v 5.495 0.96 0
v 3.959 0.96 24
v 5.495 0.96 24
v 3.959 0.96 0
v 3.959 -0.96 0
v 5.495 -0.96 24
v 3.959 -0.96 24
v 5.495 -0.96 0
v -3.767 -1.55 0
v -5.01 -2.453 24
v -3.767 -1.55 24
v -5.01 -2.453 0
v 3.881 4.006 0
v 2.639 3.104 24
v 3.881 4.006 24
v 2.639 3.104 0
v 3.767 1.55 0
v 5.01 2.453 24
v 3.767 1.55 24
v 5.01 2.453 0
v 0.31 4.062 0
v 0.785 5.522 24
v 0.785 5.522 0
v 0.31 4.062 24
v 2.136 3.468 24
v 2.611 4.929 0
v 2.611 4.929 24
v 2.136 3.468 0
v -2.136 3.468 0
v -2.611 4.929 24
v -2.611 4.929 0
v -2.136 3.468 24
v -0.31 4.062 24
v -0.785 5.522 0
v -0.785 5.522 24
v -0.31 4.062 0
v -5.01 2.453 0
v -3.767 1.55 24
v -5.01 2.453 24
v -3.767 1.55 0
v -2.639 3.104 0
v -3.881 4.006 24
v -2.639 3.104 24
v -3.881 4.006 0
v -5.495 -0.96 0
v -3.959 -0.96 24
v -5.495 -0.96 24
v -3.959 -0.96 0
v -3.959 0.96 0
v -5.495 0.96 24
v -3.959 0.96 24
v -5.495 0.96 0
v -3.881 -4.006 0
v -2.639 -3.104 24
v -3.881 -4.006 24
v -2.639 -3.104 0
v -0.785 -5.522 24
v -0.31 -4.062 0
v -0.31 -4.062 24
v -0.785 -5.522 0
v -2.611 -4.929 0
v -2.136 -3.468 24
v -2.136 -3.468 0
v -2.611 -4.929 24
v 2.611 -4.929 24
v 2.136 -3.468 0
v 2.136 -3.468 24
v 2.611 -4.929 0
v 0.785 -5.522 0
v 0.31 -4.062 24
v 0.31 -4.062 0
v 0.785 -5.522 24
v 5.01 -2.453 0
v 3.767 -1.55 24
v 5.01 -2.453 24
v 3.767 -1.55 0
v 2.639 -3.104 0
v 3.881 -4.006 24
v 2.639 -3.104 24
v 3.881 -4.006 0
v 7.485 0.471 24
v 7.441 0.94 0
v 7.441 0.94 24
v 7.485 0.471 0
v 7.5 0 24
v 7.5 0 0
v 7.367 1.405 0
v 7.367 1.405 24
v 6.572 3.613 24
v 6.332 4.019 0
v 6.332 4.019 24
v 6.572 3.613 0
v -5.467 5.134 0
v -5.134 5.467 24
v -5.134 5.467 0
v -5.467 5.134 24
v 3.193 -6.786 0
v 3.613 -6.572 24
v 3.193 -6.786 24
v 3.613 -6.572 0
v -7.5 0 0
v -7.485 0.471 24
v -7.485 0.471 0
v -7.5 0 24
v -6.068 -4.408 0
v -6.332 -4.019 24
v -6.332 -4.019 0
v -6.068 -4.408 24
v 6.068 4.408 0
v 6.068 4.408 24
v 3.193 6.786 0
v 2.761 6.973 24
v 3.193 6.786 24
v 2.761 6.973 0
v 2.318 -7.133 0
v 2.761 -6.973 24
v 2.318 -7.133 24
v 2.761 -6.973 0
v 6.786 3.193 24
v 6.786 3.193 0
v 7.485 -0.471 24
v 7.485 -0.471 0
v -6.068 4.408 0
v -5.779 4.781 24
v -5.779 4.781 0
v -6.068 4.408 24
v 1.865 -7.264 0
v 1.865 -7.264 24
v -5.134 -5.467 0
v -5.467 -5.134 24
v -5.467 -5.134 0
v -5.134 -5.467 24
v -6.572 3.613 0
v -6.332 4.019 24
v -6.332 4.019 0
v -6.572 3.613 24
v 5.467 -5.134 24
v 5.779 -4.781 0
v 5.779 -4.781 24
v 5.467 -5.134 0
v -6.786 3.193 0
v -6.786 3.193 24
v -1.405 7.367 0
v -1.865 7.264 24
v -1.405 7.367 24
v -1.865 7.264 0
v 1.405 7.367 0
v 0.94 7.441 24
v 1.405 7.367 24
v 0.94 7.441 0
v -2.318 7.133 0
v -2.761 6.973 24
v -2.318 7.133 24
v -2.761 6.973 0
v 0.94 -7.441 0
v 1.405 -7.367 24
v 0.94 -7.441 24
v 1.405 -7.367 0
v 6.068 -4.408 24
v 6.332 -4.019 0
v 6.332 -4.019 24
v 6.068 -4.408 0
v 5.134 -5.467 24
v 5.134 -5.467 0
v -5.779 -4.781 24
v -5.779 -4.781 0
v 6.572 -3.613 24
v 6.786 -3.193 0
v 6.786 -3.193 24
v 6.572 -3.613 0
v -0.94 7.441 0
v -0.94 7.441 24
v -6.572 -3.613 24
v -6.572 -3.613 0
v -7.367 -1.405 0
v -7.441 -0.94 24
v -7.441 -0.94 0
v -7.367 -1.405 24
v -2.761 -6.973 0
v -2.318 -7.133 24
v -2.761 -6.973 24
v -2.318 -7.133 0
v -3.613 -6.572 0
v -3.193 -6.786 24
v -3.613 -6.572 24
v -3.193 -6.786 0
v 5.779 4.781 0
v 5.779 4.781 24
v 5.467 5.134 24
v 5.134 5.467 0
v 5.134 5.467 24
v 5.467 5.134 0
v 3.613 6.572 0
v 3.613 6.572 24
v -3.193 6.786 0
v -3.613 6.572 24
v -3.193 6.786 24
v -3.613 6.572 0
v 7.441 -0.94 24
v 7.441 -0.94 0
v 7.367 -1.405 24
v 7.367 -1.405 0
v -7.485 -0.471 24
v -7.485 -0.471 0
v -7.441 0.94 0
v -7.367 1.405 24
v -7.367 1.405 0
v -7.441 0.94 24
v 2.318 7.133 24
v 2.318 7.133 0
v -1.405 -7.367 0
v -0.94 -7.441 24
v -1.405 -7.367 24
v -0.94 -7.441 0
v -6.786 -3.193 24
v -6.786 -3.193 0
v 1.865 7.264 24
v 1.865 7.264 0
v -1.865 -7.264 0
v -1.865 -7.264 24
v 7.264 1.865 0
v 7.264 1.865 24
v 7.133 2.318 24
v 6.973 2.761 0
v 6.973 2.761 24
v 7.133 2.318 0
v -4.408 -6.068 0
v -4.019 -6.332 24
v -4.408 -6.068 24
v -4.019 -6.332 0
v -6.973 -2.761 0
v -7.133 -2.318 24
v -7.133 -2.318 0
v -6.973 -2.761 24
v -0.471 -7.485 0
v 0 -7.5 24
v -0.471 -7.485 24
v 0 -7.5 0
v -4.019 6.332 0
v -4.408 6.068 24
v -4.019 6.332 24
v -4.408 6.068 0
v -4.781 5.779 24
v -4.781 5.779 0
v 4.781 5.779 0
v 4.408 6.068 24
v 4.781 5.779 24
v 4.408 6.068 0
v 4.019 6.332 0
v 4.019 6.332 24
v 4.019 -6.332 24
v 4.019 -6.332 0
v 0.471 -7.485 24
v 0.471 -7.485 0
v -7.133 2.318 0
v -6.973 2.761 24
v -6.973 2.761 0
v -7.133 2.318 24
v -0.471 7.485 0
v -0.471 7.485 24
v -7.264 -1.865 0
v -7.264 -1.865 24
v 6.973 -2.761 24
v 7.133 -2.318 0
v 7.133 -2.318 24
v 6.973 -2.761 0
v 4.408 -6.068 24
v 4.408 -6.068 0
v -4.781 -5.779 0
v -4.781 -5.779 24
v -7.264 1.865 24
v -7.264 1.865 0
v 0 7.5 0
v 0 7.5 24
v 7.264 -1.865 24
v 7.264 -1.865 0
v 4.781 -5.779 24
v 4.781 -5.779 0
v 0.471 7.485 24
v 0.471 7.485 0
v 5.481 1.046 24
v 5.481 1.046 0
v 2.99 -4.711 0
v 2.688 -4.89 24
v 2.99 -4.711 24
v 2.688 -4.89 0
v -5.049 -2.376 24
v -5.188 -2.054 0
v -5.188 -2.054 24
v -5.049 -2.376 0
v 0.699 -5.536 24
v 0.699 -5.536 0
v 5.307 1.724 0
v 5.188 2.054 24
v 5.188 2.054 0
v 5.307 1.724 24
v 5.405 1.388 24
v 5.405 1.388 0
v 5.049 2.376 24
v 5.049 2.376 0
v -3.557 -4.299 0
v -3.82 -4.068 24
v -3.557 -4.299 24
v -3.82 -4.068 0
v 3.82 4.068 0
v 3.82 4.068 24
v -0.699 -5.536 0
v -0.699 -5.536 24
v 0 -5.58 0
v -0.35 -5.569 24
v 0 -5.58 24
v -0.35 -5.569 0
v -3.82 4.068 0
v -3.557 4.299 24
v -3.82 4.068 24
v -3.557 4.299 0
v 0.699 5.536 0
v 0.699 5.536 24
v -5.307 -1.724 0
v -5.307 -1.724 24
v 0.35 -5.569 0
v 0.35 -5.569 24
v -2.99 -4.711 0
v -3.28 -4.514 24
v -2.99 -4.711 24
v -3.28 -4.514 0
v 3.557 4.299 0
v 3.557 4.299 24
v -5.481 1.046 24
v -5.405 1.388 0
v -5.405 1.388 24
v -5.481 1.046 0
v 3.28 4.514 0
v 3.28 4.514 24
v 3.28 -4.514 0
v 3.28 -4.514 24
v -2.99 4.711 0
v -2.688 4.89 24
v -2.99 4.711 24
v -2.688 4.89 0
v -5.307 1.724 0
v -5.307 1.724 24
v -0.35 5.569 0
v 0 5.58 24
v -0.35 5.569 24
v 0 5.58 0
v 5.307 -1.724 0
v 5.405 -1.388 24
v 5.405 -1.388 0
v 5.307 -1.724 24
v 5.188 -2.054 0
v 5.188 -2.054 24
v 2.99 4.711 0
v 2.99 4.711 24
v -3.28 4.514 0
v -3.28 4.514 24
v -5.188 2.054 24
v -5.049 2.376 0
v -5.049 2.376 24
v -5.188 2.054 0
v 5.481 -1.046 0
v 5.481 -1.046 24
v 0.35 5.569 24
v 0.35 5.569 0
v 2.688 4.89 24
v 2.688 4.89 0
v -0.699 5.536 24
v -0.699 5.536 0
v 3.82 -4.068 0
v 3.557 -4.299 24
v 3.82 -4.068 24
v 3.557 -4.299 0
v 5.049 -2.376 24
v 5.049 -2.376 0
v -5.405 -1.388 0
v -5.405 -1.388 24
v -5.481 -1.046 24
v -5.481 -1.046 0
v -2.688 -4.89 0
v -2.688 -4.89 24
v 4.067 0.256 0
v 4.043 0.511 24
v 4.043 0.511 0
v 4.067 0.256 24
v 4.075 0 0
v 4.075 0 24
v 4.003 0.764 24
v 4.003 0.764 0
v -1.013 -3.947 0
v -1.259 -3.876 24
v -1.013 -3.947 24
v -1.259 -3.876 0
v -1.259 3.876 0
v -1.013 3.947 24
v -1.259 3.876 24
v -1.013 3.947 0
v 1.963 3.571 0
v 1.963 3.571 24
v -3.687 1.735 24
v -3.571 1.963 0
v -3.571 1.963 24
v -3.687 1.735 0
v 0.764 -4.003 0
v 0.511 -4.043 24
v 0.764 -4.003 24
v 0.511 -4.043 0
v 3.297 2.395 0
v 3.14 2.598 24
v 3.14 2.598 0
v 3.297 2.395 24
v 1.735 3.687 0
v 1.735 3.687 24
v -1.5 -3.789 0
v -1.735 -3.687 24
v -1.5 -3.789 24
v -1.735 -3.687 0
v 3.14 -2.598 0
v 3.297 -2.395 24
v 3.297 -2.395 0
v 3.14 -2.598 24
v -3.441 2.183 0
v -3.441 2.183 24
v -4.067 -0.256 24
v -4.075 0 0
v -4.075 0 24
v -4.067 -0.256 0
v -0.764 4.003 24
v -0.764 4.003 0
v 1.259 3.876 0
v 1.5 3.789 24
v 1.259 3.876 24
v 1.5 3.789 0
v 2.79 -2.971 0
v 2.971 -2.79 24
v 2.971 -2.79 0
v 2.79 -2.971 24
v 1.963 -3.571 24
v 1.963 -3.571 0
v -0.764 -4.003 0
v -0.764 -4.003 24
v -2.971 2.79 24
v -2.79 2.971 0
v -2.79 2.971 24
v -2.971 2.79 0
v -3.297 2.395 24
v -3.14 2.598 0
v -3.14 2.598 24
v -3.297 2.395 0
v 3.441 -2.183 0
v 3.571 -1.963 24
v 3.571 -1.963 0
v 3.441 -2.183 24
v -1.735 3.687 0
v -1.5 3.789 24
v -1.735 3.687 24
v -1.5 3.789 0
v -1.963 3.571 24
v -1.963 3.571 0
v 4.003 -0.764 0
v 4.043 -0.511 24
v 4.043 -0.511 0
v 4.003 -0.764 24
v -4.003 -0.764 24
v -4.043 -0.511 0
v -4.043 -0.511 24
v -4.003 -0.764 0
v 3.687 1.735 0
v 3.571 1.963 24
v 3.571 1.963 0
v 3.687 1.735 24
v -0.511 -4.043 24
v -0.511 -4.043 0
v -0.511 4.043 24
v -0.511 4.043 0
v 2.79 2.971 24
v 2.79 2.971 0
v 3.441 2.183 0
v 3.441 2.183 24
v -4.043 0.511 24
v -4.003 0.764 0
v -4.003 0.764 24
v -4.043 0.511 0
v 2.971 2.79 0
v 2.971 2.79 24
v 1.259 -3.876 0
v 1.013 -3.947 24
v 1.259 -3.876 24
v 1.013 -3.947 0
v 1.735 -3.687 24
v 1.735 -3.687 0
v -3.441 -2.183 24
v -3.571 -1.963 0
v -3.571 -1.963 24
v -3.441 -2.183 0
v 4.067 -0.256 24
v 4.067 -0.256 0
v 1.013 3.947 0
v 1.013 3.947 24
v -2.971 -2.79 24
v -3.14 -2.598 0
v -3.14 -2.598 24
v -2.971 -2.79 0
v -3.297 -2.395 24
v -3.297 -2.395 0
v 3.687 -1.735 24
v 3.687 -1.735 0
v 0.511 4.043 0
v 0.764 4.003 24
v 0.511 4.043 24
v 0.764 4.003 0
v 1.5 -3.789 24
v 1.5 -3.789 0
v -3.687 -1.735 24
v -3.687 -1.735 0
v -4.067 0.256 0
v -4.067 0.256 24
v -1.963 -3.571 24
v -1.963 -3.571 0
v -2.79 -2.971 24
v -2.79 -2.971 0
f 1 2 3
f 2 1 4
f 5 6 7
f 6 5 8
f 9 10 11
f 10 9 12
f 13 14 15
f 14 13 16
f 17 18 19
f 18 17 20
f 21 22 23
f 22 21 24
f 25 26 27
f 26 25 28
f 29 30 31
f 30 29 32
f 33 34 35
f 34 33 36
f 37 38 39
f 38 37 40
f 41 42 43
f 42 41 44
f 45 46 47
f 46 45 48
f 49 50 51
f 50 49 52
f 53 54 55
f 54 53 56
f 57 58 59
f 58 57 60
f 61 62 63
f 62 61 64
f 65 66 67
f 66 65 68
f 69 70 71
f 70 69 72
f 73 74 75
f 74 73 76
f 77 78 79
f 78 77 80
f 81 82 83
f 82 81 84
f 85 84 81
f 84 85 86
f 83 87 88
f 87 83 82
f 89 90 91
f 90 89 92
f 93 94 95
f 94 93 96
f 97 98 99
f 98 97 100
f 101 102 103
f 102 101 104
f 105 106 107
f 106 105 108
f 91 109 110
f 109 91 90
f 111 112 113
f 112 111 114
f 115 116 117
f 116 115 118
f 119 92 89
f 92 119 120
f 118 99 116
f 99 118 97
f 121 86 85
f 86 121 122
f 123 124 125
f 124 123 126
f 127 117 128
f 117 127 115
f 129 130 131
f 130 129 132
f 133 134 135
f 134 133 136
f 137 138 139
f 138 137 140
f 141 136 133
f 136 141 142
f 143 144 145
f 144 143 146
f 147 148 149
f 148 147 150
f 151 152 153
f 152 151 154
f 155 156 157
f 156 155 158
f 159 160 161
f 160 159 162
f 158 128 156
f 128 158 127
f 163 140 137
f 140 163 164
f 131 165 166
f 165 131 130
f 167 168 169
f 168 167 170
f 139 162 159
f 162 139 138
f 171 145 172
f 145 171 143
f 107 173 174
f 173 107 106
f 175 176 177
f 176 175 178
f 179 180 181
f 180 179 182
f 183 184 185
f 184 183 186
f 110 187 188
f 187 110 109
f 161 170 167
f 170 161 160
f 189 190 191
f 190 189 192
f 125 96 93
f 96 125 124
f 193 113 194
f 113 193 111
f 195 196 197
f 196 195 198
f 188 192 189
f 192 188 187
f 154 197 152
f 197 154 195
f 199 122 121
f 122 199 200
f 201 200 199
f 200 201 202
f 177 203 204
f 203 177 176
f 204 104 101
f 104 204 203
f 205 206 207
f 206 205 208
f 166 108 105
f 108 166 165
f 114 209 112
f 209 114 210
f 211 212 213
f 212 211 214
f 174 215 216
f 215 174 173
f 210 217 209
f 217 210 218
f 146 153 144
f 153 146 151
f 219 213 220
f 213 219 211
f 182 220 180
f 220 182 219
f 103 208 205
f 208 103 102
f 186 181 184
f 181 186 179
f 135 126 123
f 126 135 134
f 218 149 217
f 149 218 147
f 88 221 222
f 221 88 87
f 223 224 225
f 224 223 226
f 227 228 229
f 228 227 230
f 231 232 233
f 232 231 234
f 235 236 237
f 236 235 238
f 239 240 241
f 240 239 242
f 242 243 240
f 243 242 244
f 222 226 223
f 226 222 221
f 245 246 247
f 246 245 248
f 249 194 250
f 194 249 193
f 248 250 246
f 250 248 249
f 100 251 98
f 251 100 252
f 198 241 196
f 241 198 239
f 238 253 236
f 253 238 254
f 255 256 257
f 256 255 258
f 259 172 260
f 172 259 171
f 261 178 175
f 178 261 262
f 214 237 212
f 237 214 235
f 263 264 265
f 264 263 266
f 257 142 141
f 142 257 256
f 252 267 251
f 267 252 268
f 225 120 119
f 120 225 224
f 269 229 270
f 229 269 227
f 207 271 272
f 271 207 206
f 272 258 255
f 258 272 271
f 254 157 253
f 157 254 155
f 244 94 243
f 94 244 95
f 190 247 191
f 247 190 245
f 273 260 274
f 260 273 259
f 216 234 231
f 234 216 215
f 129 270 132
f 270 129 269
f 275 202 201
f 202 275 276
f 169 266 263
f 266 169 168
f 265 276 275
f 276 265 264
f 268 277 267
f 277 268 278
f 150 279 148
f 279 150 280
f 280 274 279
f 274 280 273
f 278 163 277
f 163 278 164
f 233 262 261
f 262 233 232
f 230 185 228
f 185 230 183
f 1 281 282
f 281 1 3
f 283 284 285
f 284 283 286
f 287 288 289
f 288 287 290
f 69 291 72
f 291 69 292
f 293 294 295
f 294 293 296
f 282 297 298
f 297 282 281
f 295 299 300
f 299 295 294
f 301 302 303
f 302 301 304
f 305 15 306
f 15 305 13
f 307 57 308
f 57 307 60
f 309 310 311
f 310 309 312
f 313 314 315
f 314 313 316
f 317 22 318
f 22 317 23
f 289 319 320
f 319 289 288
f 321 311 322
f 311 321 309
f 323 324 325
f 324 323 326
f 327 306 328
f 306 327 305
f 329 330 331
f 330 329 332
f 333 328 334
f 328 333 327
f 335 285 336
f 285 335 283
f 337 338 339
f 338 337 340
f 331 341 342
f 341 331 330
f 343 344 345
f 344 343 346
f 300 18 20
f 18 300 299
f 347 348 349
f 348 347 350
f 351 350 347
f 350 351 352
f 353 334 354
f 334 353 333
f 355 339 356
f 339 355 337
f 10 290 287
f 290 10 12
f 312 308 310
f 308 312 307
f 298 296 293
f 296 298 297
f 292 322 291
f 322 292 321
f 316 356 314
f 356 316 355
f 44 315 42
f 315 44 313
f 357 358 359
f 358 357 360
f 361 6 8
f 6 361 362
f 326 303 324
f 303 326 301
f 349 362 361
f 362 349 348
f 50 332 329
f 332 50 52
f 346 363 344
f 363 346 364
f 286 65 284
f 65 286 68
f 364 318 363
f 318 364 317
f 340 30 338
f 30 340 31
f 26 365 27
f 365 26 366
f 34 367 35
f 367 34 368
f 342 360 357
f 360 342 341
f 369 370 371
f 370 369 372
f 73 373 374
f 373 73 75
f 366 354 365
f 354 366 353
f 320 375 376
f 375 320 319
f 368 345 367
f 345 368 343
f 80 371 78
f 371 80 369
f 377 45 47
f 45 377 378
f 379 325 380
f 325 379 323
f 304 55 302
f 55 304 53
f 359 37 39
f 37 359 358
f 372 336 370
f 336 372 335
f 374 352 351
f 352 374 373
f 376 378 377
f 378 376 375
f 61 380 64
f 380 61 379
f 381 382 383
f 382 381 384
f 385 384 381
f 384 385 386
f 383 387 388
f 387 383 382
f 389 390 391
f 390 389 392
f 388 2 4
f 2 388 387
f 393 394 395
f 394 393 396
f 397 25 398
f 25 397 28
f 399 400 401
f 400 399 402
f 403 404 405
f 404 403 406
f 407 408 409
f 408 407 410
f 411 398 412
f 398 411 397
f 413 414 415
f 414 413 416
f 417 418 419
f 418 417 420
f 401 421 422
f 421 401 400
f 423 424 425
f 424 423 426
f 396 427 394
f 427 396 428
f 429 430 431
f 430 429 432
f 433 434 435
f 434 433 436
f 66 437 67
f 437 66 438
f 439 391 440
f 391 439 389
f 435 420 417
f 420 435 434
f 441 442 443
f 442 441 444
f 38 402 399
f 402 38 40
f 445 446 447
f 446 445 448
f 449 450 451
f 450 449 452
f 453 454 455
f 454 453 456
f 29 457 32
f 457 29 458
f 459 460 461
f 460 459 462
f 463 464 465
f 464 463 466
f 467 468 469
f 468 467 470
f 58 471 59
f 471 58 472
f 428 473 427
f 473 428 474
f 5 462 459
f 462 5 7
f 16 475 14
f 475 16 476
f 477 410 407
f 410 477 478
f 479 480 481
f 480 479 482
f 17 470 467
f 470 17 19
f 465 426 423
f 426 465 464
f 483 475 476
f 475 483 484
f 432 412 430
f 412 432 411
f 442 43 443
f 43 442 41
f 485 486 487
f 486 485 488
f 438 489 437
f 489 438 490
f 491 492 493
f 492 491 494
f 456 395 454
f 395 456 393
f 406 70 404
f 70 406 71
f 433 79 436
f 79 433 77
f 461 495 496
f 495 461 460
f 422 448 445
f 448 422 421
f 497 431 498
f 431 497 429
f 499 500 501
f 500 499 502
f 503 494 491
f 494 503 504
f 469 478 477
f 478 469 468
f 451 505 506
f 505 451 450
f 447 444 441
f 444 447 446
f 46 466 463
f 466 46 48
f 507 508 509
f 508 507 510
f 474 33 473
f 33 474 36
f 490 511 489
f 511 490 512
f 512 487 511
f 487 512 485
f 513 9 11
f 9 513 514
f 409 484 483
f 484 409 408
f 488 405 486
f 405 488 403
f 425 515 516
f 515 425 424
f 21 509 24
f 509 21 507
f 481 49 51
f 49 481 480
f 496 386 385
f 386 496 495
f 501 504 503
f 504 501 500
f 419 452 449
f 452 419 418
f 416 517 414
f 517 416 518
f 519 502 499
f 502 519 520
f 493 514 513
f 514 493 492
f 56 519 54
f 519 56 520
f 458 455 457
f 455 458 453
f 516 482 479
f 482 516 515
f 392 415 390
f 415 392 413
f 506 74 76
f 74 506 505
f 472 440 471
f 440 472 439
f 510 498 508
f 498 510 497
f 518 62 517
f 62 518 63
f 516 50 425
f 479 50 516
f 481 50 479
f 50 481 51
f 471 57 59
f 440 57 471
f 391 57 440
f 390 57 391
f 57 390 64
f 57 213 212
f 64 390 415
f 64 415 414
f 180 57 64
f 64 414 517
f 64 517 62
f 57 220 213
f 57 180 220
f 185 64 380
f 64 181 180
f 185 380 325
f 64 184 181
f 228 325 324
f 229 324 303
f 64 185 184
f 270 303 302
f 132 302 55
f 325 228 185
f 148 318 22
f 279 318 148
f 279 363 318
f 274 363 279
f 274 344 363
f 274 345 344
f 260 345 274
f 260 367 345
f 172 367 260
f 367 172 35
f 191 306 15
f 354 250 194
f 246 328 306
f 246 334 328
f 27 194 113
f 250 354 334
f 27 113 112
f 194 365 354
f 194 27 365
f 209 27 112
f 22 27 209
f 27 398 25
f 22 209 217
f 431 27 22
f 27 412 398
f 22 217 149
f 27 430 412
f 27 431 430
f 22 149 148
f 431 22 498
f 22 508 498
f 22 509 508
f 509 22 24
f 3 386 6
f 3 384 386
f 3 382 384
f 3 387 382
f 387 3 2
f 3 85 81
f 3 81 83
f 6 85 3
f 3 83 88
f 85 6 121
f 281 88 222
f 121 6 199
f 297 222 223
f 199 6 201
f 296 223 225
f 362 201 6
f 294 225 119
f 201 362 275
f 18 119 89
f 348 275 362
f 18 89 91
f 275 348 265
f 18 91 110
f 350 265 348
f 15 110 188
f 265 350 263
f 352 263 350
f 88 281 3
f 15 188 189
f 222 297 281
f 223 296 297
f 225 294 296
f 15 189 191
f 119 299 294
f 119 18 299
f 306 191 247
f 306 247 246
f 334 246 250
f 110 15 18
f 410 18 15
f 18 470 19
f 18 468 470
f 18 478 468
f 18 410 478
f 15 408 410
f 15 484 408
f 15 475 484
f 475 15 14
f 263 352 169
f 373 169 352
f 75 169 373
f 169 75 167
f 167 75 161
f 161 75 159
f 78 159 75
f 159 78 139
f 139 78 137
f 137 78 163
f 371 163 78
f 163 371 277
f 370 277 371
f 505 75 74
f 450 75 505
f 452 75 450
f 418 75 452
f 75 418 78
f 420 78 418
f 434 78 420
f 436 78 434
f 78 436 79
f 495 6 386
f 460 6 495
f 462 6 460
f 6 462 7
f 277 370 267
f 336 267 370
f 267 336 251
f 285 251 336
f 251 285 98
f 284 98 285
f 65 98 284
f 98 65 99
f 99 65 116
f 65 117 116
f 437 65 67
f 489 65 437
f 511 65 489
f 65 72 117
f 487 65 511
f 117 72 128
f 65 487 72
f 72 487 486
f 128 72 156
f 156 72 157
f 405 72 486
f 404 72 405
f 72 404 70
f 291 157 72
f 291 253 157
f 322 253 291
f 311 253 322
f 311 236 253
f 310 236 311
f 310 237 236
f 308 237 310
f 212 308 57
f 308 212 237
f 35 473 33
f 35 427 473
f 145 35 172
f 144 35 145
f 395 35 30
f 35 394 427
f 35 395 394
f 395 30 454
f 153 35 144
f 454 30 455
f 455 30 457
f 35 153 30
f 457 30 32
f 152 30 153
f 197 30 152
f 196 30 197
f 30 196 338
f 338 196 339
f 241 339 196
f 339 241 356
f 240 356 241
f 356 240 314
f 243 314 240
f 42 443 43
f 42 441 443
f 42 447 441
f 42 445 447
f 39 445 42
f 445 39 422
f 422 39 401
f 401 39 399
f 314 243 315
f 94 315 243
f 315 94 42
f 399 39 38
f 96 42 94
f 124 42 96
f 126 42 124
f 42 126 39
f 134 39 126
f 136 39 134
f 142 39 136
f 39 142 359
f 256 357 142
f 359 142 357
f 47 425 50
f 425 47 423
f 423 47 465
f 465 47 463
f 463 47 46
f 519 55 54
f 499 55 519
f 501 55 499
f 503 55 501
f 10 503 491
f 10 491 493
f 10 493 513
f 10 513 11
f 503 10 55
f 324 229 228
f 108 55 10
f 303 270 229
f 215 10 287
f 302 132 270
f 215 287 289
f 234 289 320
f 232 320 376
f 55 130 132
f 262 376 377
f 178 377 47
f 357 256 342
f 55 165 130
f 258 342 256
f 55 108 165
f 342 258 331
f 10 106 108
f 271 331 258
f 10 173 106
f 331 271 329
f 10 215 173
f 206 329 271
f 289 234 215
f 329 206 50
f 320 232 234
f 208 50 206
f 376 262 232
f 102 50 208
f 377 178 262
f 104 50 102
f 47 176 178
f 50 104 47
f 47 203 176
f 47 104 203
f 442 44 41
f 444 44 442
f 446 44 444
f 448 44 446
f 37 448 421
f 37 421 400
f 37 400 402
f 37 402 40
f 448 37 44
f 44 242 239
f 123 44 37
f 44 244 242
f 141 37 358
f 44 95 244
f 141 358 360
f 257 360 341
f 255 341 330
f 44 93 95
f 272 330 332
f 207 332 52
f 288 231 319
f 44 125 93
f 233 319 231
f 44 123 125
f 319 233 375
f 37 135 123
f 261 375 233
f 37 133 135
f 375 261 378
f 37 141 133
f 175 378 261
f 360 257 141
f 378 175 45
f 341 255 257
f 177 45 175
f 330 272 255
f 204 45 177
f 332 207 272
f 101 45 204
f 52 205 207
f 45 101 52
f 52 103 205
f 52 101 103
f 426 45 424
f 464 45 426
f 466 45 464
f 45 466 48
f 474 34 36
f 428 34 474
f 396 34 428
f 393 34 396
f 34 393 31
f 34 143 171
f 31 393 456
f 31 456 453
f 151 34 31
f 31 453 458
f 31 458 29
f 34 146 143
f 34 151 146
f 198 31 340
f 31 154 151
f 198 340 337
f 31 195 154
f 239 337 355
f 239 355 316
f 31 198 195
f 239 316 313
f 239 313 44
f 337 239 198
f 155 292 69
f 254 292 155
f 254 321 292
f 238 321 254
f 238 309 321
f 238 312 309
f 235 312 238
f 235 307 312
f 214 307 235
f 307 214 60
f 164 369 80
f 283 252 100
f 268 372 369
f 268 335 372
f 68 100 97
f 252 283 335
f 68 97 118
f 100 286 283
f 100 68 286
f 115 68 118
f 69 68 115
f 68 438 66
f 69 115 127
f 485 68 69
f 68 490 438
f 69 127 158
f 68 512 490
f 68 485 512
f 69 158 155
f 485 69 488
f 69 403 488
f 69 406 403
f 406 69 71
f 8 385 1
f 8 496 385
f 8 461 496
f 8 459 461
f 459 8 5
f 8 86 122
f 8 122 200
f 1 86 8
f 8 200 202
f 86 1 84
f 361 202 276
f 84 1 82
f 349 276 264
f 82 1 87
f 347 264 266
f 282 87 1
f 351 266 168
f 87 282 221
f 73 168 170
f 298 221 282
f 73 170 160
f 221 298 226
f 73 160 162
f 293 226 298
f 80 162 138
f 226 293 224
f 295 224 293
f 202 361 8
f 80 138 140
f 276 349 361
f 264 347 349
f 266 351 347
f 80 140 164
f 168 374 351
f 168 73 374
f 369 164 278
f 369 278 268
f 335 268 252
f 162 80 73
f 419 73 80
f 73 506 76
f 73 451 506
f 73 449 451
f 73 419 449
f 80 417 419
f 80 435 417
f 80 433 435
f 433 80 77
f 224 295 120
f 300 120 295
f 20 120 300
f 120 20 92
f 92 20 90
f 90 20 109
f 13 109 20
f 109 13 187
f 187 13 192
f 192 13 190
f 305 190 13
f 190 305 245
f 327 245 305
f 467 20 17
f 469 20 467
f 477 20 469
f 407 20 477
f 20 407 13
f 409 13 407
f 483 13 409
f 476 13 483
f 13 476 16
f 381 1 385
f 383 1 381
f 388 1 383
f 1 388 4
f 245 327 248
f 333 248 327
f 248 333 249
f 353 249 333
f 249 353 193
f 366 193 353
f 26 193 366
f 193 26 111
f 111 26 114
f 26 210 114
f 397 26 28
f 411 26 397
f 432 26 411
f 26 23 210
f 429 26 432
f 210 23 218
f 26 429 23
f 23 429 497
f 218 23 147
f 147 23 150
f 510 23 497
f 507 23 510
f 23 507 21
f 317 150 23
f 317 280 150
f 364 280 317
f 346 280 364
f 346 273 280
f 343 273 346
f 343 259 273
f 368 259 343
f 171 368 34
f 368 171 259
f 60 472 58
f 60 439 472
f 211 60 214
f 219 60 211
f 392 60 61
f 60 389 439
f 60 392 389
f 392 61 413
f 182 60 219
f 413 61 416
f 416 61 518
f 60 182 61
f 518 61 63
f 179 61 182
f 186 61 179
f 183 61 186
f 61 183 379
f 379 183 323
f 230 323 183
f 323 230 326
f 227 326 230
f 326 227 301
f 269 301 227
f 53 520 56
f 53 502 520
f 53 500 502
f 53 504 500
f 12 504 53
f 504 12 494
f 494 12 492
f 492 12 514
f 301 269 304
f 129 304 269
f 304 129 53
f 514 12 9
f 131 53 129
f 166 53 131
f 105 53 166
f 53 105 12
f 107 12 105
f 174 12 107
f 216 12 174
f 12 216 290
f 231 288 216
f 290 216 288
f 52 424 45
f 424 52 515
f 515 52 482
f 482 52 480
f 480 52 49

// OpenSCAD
 /*
 * Customizable Linear Bushing - https://www.thingiverse.com/thing:2202854
 * by Dennis Hofmann - https://www.thingiverse.com/mightynozzle/about
 * created 2017-03-25
 * updated 2018-02-15
 * version v1.8
 *
 * Changelog
 * --------------
 * v1.8:
 *      - groove option added
 * v1.7:
 *      - fixed inner diameter
 * v1.6:
 *      - added chamfer angle option
 * v1.5:
 *      - fixed graphic glitch
 * v1.4:
 *      - added chamfer option
 *
 * v1.1-1.3:
 *      - initial model with minor changes in description
 *
 * --------------
 * 
 * This work is licensed under the Creative Commons - Attribution - Non-Commercial license.
 * https://creativecommons.org/licenses/by-nc/3.0/
 */
 
 // Parameter Section //
//-------------------//

/* [Bushing Settings] */

// Equals dr in technical diagrams. Use the outer diameter of the rod
// + tolerance value of your printer. Do some test prints before print
// a whole set of bushings. Best way in my case is to choose the
// bushing where can push it in with some effort on the rod and slide
// it by hand without any tools. Then slide it back and forth along
// the rod, until the bushing has the expected behavior. I suggest you
// not to use any drill or heat. The sliding of the bushing generates
// enough heat from its friction against the rod. Standard values:
// 6.00 for LM6(L)UU, 8.00 (default 8.15) for LM8(L)UU, 10.00 for
// LM10(L)UU, 12.00 for LM12(L)UU, 16.00 for LM16UU, ...
inner_diameter_in_millimeter = 8.15;

// Equals D in technical diagrams. Use the inner diameter of housing
// where the bushing sits + tolerance value of your printer. Depends
// on the filament you use and the total wall thickness of the
// bushings, the bushing shouldn't fit to tight in the housing.
// Standard values: 12.0 for LM6(L)UU, 15.0 (default) for LM8(L)UU,
// 19.0 for LM10(L)UU, 21.0 for LM12(L)UU, 28.0 for LM16UU, ...
outer_diameter_in_millimeter = 15.0; 

// Equals L in technical diagrams. Standard values: 19.0 for LM6UU,
// 24.0 for LM8UU, 29.0 for LM10UU, 30.0 for LM12UU, 35.0 for LM6LUU,
// 37.0 for LM16UU, 45.0 for LM8LUU, 55.0 for LM10LUU, 57.0 for
// LM12LUU, ...
bushing_length_in_millimeter = 24.0;

// Use a value to get straight primeters without any zigzag between
// the outer and inner perimeter. I use the value of 0.48 for 0.4
// nozzle. This is the auto extrusion width of 0.48 of simplify3d.
// More information about this in the description of this design on
// thingiverse.
extrusion_width_in_millimeter = 0.48; 

// Use even numbers. E.g. 4 for LM8(L)UU. Don't forget to set the
// perimeter number in your Slicer!
number_of_perimeters = 4; //[2:2:10]

// Choose a number to provide a gap between the teeth in the bushing.
// E.g. 8 or 10 for LM8(L)UU. The tooth width depends on the
// extrusion_width_in_millimeter and the number_of_perimeters.
number_of_teeth = 10; //[3:20]

// Radius of the chamfer. Set a chamfer if you want to insert the rod easier. This also helps if your prints tends to create elephant foot in the first few layers. A value between 0.3 and 1.0 might be a good value. Set a value above 0 might destroy the preview of the bushing. But the resulting stl-File will be correct.
chamfer_radius_in_millimeter = 0.0;

// Set the angle of the chamfer. 
chamfer_angle_in_degree = 55.0; // [30:75]

// Equals W in technical diagram. 1.1 for LM6/8(L)UU, 1.3 for LM10/12/13(L)UU, 1.6 for LM16/20(L)UU, 1.85 for LM25/30(L)UU, 2.1 for LM35/40(L)UU, 2.6 for LM50(L)UU, 3.15 for LM60(L)UU
groove_length_in_millimeter = 0;

// Equals D1 in technical diagram. 11.5 for LM6(L)UU, 14.3 for LM8(L)UU, 18.0 for LM10(L)UU, 20.0 for LM12(L)UU, 22.0 for LM13(L)UU, 27.0 for LM16(L)UU, 30.5 for LM20(L)UU, 38.0 for LM25(L)UU, 43.0 for LM30(L)UU, 49.0 for LM35(L)UU, 57.0 for LM40(L)UU, 76.5 for LM50(L)UU, 86.5 for LM60(L)UU
groove_diameter_in_millimeter = 0;

// Equals B in technical diagram. Outer distance between both grooves. 13.5 for LM6UU, 17.5 for LM8UU, 22.0 for LM10UU, 23.0 for LM12UU, 26.5 for LM16UU, 27.0 for LM6LUU, 35.0 for LM8UU, 44.0 for LM10LUU, 46.0 for LM12LUU, 53.0 for LM16LUU
groove_distance_in_millimeter = 0;

/* [Hidden] */
inner_dia = inner_diameter_in_millimeter;
outer_dia = outer_diameter_in_millimeter;
bushing_l = bushing_length_in_millimeter;
extrusion_w = extrusion_width_in_millimeter;
perimeters = number_of_perimeters;
teeth = number_of_teeth;
chamfer_r = chamfer_radius_in_millimeter;
chamfer_h = tan(chamfer_angle_in_degree) * chamfer_r;
groove_l = groove_length_in_millimeter;
groove_dia = groove_diameter_in_millimeter;
groove_d = groove_distance_in_millimeter;


$fn=100;

 // Program Section //
//-----------------//

color("HotPink") difference() {
    bushing();
    if(chamfer_r > 0) {
        chamfer_cut();
        translate([0, 0, bushing_l]) {
            rotate([180,0,0]) {
                chamfer_cut();
            }
        }
    }
    groove_cut();
}


 // Module Section //
//----------------//

module bushing() {
    translate([0, 0, bushing_l / 2]) {
        difference() {
            union() {
                difference() {
                    for(tooth = [0 : teeth - 1])
                        rotate([0, 0, 360 / teeth * tooth]) {
                            translate([outer_dia / 4, 0, 0]) {
                                cube([outer_dia / 2, extrusion_w * perimeters, bushing_l + 1], center = true);
                            }
                        }
                        translate([0, 0, -bushing_l / 2-1]) {
                            ring(outer_dia * 2, outer_dia, bushing_l + 2);
                        }
                    }
                    translate([0, 0, -bushing_l / 2 - 1]) {
                        ring(outer_dia, outer_dia - extrusion_w * perimeters * 2, bushing_l + 2);
                    }
            }
            cylinder(d = inner_dia, h = bushing_l + 2, center = true);
            translate([0, 0, bushing_l / 2]) {
                cylinder(d = outer_dia + 1, h = 2, $f = 16);
            }
            translate([0, 0, -(bushing_l / 2 + 2)]) {
                cylinder(d = outer_dia + 1, h = 2, $f = 16);
            }
        }
    }
}

module ring(d1, d2, height) {
    difference() {
        cylinder(d = d1, h = height, center = false);
        cylinder(d = d2, h = height, center = false);
    }
}

module chamfer_cut() {
    union() {
        difference() {
            translate([0, 0, -1]) {
                cylinder(d = outer_dia + 1, h = chamfer_h + 1);
            }
            intersection() {
                cylinder(d = outer_dia, h = chamfer_h);
                cylinder(d1 = outer_dia - chamfer_r * 2, d2 = outer_dia, h = chamfer_h);
            }
        }
        translate([0, 0, -chamfer_h]) {
            intersection() {
                cylinder(d = inner_dia + chamfer_r * 4, h = chamfer_h * 2);
                cylinder(d1 = inner_dia + chamfer_r * 4, d2 = inner_dia, h = chamfer_h * 2);
            }
        }
        translate([0, 0, -10]) {
            cylinder(d = outer_dia + 1, h = 10);
        }
    }
}

module groove_cut() {
    translate([0, 0, bushing_l / 2 - groove_d / 2]) {
        ring(outer_dia + 1, groove_dia, groove_l);
    }
    translate([0, 0, bushing_l - ((bushing_l / 2) - (groove_d / 2) + groove_l)]) {
        ring(outer_dia + 1, groove_dia, groove_l);
    }
}
